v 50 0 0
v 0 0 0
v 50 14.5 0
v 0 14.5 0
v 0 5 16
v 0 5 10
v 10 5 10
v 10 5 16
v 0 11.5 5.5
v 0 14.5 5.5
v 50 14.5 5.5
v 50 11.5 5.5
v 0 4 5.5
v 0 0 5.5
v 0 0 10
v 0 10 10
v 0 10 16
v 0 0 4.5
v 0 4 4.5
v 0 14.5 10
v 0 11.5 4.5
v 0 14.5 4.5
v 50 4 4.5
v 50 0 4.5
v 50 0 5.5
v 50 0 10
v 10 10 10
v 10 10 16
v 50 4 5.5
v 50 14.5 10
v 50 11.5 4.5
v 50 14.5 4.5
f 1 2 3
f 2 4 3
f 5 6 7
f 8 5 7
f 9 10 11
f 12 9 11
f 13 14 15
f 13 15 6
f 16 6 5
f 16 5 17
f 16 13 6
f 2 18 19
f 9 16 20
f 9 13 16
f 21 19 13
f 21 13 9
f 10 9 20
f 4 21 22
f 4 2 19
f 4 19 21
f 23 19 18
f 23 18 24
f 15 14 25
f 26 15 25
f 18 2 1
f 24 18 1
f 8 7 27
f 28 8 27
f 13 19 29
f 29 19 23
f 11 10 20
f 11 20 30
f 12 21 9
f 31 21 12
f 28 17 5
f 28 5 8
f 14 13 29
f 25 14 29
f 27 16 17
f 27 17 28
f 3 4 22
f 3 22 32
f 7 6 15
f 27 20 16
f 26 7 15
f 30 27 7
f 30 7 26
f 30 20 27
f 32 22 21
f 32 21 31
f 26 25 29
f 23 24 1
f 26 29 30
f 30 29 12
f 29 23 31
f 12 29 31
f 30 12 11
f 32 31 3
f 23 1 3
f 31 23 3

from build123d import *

# Parameters (mm, degrees)
BOX002_W     = 50
BOX002_H     = 3
BOX002_DEPTH = 1
BOX001_W     = 50
BOX001_H     = 4
BOX001_DEPTH = 1
BOX_W        = 50
BOX_H        = 14.5
BOX_DEPTH    = 10
BOX003_W     = 10
BOX003_H     = 5
BOX003_DEPTH = 16


with BuildPart() as cube002:
    # Box002 → Box002 (new body)
    with BuildSketch(Plane(origin=(0, 11.5, 4.5), x_dir=(1, 0, 0), z_dir=(0, 0, 1))):
        with Locations((25, 1.5)):
            Rectangle(BOX002_W, BOX002_H)
    extrude(amount=BOX002_DEPTH)


with BuildPart() as cube001:
    # Box001 → Box001 (new body)
    with BuildSketch(Plane.XY.offset(4.5)):
        with Locations((25, 2)):
            Rectangle(BOX001_W, BOX001_H)
    extrude(amount=BOX001_DEPTH)


with BuildPart() as cut001:
    # Box → Box (new body)
    with BuildSketch(Plane.XY):
        with Locations((25, 7.25)):
            Rectangle(BOX_W, BOX_H)
    extrude(amount=BOX_DEPTH)

    # Cut: cut Cube001
    add(cube001.part, mode=Mode.SUBTRACT)

    # Cut001: cut Cube002
    add(cube002.part, mode=Mode.SUBTRACT)


with BuildPart() as test_slider001:
    # Box003 → Box003 (new body)
    with BuildSketch(Plane(origin=(0, 5, 0), x_dir=(1, 0, 0), z_dir=(0, 0, 1))):
        with Locations((5, 2.5)):
            Rectangle(BOX003_W, BOX003_H)
    extrude(amount=BOX003_DEPTH)

    # Fusion: union Cut001
    add(cut001.part)


solid = test_slider001.part
